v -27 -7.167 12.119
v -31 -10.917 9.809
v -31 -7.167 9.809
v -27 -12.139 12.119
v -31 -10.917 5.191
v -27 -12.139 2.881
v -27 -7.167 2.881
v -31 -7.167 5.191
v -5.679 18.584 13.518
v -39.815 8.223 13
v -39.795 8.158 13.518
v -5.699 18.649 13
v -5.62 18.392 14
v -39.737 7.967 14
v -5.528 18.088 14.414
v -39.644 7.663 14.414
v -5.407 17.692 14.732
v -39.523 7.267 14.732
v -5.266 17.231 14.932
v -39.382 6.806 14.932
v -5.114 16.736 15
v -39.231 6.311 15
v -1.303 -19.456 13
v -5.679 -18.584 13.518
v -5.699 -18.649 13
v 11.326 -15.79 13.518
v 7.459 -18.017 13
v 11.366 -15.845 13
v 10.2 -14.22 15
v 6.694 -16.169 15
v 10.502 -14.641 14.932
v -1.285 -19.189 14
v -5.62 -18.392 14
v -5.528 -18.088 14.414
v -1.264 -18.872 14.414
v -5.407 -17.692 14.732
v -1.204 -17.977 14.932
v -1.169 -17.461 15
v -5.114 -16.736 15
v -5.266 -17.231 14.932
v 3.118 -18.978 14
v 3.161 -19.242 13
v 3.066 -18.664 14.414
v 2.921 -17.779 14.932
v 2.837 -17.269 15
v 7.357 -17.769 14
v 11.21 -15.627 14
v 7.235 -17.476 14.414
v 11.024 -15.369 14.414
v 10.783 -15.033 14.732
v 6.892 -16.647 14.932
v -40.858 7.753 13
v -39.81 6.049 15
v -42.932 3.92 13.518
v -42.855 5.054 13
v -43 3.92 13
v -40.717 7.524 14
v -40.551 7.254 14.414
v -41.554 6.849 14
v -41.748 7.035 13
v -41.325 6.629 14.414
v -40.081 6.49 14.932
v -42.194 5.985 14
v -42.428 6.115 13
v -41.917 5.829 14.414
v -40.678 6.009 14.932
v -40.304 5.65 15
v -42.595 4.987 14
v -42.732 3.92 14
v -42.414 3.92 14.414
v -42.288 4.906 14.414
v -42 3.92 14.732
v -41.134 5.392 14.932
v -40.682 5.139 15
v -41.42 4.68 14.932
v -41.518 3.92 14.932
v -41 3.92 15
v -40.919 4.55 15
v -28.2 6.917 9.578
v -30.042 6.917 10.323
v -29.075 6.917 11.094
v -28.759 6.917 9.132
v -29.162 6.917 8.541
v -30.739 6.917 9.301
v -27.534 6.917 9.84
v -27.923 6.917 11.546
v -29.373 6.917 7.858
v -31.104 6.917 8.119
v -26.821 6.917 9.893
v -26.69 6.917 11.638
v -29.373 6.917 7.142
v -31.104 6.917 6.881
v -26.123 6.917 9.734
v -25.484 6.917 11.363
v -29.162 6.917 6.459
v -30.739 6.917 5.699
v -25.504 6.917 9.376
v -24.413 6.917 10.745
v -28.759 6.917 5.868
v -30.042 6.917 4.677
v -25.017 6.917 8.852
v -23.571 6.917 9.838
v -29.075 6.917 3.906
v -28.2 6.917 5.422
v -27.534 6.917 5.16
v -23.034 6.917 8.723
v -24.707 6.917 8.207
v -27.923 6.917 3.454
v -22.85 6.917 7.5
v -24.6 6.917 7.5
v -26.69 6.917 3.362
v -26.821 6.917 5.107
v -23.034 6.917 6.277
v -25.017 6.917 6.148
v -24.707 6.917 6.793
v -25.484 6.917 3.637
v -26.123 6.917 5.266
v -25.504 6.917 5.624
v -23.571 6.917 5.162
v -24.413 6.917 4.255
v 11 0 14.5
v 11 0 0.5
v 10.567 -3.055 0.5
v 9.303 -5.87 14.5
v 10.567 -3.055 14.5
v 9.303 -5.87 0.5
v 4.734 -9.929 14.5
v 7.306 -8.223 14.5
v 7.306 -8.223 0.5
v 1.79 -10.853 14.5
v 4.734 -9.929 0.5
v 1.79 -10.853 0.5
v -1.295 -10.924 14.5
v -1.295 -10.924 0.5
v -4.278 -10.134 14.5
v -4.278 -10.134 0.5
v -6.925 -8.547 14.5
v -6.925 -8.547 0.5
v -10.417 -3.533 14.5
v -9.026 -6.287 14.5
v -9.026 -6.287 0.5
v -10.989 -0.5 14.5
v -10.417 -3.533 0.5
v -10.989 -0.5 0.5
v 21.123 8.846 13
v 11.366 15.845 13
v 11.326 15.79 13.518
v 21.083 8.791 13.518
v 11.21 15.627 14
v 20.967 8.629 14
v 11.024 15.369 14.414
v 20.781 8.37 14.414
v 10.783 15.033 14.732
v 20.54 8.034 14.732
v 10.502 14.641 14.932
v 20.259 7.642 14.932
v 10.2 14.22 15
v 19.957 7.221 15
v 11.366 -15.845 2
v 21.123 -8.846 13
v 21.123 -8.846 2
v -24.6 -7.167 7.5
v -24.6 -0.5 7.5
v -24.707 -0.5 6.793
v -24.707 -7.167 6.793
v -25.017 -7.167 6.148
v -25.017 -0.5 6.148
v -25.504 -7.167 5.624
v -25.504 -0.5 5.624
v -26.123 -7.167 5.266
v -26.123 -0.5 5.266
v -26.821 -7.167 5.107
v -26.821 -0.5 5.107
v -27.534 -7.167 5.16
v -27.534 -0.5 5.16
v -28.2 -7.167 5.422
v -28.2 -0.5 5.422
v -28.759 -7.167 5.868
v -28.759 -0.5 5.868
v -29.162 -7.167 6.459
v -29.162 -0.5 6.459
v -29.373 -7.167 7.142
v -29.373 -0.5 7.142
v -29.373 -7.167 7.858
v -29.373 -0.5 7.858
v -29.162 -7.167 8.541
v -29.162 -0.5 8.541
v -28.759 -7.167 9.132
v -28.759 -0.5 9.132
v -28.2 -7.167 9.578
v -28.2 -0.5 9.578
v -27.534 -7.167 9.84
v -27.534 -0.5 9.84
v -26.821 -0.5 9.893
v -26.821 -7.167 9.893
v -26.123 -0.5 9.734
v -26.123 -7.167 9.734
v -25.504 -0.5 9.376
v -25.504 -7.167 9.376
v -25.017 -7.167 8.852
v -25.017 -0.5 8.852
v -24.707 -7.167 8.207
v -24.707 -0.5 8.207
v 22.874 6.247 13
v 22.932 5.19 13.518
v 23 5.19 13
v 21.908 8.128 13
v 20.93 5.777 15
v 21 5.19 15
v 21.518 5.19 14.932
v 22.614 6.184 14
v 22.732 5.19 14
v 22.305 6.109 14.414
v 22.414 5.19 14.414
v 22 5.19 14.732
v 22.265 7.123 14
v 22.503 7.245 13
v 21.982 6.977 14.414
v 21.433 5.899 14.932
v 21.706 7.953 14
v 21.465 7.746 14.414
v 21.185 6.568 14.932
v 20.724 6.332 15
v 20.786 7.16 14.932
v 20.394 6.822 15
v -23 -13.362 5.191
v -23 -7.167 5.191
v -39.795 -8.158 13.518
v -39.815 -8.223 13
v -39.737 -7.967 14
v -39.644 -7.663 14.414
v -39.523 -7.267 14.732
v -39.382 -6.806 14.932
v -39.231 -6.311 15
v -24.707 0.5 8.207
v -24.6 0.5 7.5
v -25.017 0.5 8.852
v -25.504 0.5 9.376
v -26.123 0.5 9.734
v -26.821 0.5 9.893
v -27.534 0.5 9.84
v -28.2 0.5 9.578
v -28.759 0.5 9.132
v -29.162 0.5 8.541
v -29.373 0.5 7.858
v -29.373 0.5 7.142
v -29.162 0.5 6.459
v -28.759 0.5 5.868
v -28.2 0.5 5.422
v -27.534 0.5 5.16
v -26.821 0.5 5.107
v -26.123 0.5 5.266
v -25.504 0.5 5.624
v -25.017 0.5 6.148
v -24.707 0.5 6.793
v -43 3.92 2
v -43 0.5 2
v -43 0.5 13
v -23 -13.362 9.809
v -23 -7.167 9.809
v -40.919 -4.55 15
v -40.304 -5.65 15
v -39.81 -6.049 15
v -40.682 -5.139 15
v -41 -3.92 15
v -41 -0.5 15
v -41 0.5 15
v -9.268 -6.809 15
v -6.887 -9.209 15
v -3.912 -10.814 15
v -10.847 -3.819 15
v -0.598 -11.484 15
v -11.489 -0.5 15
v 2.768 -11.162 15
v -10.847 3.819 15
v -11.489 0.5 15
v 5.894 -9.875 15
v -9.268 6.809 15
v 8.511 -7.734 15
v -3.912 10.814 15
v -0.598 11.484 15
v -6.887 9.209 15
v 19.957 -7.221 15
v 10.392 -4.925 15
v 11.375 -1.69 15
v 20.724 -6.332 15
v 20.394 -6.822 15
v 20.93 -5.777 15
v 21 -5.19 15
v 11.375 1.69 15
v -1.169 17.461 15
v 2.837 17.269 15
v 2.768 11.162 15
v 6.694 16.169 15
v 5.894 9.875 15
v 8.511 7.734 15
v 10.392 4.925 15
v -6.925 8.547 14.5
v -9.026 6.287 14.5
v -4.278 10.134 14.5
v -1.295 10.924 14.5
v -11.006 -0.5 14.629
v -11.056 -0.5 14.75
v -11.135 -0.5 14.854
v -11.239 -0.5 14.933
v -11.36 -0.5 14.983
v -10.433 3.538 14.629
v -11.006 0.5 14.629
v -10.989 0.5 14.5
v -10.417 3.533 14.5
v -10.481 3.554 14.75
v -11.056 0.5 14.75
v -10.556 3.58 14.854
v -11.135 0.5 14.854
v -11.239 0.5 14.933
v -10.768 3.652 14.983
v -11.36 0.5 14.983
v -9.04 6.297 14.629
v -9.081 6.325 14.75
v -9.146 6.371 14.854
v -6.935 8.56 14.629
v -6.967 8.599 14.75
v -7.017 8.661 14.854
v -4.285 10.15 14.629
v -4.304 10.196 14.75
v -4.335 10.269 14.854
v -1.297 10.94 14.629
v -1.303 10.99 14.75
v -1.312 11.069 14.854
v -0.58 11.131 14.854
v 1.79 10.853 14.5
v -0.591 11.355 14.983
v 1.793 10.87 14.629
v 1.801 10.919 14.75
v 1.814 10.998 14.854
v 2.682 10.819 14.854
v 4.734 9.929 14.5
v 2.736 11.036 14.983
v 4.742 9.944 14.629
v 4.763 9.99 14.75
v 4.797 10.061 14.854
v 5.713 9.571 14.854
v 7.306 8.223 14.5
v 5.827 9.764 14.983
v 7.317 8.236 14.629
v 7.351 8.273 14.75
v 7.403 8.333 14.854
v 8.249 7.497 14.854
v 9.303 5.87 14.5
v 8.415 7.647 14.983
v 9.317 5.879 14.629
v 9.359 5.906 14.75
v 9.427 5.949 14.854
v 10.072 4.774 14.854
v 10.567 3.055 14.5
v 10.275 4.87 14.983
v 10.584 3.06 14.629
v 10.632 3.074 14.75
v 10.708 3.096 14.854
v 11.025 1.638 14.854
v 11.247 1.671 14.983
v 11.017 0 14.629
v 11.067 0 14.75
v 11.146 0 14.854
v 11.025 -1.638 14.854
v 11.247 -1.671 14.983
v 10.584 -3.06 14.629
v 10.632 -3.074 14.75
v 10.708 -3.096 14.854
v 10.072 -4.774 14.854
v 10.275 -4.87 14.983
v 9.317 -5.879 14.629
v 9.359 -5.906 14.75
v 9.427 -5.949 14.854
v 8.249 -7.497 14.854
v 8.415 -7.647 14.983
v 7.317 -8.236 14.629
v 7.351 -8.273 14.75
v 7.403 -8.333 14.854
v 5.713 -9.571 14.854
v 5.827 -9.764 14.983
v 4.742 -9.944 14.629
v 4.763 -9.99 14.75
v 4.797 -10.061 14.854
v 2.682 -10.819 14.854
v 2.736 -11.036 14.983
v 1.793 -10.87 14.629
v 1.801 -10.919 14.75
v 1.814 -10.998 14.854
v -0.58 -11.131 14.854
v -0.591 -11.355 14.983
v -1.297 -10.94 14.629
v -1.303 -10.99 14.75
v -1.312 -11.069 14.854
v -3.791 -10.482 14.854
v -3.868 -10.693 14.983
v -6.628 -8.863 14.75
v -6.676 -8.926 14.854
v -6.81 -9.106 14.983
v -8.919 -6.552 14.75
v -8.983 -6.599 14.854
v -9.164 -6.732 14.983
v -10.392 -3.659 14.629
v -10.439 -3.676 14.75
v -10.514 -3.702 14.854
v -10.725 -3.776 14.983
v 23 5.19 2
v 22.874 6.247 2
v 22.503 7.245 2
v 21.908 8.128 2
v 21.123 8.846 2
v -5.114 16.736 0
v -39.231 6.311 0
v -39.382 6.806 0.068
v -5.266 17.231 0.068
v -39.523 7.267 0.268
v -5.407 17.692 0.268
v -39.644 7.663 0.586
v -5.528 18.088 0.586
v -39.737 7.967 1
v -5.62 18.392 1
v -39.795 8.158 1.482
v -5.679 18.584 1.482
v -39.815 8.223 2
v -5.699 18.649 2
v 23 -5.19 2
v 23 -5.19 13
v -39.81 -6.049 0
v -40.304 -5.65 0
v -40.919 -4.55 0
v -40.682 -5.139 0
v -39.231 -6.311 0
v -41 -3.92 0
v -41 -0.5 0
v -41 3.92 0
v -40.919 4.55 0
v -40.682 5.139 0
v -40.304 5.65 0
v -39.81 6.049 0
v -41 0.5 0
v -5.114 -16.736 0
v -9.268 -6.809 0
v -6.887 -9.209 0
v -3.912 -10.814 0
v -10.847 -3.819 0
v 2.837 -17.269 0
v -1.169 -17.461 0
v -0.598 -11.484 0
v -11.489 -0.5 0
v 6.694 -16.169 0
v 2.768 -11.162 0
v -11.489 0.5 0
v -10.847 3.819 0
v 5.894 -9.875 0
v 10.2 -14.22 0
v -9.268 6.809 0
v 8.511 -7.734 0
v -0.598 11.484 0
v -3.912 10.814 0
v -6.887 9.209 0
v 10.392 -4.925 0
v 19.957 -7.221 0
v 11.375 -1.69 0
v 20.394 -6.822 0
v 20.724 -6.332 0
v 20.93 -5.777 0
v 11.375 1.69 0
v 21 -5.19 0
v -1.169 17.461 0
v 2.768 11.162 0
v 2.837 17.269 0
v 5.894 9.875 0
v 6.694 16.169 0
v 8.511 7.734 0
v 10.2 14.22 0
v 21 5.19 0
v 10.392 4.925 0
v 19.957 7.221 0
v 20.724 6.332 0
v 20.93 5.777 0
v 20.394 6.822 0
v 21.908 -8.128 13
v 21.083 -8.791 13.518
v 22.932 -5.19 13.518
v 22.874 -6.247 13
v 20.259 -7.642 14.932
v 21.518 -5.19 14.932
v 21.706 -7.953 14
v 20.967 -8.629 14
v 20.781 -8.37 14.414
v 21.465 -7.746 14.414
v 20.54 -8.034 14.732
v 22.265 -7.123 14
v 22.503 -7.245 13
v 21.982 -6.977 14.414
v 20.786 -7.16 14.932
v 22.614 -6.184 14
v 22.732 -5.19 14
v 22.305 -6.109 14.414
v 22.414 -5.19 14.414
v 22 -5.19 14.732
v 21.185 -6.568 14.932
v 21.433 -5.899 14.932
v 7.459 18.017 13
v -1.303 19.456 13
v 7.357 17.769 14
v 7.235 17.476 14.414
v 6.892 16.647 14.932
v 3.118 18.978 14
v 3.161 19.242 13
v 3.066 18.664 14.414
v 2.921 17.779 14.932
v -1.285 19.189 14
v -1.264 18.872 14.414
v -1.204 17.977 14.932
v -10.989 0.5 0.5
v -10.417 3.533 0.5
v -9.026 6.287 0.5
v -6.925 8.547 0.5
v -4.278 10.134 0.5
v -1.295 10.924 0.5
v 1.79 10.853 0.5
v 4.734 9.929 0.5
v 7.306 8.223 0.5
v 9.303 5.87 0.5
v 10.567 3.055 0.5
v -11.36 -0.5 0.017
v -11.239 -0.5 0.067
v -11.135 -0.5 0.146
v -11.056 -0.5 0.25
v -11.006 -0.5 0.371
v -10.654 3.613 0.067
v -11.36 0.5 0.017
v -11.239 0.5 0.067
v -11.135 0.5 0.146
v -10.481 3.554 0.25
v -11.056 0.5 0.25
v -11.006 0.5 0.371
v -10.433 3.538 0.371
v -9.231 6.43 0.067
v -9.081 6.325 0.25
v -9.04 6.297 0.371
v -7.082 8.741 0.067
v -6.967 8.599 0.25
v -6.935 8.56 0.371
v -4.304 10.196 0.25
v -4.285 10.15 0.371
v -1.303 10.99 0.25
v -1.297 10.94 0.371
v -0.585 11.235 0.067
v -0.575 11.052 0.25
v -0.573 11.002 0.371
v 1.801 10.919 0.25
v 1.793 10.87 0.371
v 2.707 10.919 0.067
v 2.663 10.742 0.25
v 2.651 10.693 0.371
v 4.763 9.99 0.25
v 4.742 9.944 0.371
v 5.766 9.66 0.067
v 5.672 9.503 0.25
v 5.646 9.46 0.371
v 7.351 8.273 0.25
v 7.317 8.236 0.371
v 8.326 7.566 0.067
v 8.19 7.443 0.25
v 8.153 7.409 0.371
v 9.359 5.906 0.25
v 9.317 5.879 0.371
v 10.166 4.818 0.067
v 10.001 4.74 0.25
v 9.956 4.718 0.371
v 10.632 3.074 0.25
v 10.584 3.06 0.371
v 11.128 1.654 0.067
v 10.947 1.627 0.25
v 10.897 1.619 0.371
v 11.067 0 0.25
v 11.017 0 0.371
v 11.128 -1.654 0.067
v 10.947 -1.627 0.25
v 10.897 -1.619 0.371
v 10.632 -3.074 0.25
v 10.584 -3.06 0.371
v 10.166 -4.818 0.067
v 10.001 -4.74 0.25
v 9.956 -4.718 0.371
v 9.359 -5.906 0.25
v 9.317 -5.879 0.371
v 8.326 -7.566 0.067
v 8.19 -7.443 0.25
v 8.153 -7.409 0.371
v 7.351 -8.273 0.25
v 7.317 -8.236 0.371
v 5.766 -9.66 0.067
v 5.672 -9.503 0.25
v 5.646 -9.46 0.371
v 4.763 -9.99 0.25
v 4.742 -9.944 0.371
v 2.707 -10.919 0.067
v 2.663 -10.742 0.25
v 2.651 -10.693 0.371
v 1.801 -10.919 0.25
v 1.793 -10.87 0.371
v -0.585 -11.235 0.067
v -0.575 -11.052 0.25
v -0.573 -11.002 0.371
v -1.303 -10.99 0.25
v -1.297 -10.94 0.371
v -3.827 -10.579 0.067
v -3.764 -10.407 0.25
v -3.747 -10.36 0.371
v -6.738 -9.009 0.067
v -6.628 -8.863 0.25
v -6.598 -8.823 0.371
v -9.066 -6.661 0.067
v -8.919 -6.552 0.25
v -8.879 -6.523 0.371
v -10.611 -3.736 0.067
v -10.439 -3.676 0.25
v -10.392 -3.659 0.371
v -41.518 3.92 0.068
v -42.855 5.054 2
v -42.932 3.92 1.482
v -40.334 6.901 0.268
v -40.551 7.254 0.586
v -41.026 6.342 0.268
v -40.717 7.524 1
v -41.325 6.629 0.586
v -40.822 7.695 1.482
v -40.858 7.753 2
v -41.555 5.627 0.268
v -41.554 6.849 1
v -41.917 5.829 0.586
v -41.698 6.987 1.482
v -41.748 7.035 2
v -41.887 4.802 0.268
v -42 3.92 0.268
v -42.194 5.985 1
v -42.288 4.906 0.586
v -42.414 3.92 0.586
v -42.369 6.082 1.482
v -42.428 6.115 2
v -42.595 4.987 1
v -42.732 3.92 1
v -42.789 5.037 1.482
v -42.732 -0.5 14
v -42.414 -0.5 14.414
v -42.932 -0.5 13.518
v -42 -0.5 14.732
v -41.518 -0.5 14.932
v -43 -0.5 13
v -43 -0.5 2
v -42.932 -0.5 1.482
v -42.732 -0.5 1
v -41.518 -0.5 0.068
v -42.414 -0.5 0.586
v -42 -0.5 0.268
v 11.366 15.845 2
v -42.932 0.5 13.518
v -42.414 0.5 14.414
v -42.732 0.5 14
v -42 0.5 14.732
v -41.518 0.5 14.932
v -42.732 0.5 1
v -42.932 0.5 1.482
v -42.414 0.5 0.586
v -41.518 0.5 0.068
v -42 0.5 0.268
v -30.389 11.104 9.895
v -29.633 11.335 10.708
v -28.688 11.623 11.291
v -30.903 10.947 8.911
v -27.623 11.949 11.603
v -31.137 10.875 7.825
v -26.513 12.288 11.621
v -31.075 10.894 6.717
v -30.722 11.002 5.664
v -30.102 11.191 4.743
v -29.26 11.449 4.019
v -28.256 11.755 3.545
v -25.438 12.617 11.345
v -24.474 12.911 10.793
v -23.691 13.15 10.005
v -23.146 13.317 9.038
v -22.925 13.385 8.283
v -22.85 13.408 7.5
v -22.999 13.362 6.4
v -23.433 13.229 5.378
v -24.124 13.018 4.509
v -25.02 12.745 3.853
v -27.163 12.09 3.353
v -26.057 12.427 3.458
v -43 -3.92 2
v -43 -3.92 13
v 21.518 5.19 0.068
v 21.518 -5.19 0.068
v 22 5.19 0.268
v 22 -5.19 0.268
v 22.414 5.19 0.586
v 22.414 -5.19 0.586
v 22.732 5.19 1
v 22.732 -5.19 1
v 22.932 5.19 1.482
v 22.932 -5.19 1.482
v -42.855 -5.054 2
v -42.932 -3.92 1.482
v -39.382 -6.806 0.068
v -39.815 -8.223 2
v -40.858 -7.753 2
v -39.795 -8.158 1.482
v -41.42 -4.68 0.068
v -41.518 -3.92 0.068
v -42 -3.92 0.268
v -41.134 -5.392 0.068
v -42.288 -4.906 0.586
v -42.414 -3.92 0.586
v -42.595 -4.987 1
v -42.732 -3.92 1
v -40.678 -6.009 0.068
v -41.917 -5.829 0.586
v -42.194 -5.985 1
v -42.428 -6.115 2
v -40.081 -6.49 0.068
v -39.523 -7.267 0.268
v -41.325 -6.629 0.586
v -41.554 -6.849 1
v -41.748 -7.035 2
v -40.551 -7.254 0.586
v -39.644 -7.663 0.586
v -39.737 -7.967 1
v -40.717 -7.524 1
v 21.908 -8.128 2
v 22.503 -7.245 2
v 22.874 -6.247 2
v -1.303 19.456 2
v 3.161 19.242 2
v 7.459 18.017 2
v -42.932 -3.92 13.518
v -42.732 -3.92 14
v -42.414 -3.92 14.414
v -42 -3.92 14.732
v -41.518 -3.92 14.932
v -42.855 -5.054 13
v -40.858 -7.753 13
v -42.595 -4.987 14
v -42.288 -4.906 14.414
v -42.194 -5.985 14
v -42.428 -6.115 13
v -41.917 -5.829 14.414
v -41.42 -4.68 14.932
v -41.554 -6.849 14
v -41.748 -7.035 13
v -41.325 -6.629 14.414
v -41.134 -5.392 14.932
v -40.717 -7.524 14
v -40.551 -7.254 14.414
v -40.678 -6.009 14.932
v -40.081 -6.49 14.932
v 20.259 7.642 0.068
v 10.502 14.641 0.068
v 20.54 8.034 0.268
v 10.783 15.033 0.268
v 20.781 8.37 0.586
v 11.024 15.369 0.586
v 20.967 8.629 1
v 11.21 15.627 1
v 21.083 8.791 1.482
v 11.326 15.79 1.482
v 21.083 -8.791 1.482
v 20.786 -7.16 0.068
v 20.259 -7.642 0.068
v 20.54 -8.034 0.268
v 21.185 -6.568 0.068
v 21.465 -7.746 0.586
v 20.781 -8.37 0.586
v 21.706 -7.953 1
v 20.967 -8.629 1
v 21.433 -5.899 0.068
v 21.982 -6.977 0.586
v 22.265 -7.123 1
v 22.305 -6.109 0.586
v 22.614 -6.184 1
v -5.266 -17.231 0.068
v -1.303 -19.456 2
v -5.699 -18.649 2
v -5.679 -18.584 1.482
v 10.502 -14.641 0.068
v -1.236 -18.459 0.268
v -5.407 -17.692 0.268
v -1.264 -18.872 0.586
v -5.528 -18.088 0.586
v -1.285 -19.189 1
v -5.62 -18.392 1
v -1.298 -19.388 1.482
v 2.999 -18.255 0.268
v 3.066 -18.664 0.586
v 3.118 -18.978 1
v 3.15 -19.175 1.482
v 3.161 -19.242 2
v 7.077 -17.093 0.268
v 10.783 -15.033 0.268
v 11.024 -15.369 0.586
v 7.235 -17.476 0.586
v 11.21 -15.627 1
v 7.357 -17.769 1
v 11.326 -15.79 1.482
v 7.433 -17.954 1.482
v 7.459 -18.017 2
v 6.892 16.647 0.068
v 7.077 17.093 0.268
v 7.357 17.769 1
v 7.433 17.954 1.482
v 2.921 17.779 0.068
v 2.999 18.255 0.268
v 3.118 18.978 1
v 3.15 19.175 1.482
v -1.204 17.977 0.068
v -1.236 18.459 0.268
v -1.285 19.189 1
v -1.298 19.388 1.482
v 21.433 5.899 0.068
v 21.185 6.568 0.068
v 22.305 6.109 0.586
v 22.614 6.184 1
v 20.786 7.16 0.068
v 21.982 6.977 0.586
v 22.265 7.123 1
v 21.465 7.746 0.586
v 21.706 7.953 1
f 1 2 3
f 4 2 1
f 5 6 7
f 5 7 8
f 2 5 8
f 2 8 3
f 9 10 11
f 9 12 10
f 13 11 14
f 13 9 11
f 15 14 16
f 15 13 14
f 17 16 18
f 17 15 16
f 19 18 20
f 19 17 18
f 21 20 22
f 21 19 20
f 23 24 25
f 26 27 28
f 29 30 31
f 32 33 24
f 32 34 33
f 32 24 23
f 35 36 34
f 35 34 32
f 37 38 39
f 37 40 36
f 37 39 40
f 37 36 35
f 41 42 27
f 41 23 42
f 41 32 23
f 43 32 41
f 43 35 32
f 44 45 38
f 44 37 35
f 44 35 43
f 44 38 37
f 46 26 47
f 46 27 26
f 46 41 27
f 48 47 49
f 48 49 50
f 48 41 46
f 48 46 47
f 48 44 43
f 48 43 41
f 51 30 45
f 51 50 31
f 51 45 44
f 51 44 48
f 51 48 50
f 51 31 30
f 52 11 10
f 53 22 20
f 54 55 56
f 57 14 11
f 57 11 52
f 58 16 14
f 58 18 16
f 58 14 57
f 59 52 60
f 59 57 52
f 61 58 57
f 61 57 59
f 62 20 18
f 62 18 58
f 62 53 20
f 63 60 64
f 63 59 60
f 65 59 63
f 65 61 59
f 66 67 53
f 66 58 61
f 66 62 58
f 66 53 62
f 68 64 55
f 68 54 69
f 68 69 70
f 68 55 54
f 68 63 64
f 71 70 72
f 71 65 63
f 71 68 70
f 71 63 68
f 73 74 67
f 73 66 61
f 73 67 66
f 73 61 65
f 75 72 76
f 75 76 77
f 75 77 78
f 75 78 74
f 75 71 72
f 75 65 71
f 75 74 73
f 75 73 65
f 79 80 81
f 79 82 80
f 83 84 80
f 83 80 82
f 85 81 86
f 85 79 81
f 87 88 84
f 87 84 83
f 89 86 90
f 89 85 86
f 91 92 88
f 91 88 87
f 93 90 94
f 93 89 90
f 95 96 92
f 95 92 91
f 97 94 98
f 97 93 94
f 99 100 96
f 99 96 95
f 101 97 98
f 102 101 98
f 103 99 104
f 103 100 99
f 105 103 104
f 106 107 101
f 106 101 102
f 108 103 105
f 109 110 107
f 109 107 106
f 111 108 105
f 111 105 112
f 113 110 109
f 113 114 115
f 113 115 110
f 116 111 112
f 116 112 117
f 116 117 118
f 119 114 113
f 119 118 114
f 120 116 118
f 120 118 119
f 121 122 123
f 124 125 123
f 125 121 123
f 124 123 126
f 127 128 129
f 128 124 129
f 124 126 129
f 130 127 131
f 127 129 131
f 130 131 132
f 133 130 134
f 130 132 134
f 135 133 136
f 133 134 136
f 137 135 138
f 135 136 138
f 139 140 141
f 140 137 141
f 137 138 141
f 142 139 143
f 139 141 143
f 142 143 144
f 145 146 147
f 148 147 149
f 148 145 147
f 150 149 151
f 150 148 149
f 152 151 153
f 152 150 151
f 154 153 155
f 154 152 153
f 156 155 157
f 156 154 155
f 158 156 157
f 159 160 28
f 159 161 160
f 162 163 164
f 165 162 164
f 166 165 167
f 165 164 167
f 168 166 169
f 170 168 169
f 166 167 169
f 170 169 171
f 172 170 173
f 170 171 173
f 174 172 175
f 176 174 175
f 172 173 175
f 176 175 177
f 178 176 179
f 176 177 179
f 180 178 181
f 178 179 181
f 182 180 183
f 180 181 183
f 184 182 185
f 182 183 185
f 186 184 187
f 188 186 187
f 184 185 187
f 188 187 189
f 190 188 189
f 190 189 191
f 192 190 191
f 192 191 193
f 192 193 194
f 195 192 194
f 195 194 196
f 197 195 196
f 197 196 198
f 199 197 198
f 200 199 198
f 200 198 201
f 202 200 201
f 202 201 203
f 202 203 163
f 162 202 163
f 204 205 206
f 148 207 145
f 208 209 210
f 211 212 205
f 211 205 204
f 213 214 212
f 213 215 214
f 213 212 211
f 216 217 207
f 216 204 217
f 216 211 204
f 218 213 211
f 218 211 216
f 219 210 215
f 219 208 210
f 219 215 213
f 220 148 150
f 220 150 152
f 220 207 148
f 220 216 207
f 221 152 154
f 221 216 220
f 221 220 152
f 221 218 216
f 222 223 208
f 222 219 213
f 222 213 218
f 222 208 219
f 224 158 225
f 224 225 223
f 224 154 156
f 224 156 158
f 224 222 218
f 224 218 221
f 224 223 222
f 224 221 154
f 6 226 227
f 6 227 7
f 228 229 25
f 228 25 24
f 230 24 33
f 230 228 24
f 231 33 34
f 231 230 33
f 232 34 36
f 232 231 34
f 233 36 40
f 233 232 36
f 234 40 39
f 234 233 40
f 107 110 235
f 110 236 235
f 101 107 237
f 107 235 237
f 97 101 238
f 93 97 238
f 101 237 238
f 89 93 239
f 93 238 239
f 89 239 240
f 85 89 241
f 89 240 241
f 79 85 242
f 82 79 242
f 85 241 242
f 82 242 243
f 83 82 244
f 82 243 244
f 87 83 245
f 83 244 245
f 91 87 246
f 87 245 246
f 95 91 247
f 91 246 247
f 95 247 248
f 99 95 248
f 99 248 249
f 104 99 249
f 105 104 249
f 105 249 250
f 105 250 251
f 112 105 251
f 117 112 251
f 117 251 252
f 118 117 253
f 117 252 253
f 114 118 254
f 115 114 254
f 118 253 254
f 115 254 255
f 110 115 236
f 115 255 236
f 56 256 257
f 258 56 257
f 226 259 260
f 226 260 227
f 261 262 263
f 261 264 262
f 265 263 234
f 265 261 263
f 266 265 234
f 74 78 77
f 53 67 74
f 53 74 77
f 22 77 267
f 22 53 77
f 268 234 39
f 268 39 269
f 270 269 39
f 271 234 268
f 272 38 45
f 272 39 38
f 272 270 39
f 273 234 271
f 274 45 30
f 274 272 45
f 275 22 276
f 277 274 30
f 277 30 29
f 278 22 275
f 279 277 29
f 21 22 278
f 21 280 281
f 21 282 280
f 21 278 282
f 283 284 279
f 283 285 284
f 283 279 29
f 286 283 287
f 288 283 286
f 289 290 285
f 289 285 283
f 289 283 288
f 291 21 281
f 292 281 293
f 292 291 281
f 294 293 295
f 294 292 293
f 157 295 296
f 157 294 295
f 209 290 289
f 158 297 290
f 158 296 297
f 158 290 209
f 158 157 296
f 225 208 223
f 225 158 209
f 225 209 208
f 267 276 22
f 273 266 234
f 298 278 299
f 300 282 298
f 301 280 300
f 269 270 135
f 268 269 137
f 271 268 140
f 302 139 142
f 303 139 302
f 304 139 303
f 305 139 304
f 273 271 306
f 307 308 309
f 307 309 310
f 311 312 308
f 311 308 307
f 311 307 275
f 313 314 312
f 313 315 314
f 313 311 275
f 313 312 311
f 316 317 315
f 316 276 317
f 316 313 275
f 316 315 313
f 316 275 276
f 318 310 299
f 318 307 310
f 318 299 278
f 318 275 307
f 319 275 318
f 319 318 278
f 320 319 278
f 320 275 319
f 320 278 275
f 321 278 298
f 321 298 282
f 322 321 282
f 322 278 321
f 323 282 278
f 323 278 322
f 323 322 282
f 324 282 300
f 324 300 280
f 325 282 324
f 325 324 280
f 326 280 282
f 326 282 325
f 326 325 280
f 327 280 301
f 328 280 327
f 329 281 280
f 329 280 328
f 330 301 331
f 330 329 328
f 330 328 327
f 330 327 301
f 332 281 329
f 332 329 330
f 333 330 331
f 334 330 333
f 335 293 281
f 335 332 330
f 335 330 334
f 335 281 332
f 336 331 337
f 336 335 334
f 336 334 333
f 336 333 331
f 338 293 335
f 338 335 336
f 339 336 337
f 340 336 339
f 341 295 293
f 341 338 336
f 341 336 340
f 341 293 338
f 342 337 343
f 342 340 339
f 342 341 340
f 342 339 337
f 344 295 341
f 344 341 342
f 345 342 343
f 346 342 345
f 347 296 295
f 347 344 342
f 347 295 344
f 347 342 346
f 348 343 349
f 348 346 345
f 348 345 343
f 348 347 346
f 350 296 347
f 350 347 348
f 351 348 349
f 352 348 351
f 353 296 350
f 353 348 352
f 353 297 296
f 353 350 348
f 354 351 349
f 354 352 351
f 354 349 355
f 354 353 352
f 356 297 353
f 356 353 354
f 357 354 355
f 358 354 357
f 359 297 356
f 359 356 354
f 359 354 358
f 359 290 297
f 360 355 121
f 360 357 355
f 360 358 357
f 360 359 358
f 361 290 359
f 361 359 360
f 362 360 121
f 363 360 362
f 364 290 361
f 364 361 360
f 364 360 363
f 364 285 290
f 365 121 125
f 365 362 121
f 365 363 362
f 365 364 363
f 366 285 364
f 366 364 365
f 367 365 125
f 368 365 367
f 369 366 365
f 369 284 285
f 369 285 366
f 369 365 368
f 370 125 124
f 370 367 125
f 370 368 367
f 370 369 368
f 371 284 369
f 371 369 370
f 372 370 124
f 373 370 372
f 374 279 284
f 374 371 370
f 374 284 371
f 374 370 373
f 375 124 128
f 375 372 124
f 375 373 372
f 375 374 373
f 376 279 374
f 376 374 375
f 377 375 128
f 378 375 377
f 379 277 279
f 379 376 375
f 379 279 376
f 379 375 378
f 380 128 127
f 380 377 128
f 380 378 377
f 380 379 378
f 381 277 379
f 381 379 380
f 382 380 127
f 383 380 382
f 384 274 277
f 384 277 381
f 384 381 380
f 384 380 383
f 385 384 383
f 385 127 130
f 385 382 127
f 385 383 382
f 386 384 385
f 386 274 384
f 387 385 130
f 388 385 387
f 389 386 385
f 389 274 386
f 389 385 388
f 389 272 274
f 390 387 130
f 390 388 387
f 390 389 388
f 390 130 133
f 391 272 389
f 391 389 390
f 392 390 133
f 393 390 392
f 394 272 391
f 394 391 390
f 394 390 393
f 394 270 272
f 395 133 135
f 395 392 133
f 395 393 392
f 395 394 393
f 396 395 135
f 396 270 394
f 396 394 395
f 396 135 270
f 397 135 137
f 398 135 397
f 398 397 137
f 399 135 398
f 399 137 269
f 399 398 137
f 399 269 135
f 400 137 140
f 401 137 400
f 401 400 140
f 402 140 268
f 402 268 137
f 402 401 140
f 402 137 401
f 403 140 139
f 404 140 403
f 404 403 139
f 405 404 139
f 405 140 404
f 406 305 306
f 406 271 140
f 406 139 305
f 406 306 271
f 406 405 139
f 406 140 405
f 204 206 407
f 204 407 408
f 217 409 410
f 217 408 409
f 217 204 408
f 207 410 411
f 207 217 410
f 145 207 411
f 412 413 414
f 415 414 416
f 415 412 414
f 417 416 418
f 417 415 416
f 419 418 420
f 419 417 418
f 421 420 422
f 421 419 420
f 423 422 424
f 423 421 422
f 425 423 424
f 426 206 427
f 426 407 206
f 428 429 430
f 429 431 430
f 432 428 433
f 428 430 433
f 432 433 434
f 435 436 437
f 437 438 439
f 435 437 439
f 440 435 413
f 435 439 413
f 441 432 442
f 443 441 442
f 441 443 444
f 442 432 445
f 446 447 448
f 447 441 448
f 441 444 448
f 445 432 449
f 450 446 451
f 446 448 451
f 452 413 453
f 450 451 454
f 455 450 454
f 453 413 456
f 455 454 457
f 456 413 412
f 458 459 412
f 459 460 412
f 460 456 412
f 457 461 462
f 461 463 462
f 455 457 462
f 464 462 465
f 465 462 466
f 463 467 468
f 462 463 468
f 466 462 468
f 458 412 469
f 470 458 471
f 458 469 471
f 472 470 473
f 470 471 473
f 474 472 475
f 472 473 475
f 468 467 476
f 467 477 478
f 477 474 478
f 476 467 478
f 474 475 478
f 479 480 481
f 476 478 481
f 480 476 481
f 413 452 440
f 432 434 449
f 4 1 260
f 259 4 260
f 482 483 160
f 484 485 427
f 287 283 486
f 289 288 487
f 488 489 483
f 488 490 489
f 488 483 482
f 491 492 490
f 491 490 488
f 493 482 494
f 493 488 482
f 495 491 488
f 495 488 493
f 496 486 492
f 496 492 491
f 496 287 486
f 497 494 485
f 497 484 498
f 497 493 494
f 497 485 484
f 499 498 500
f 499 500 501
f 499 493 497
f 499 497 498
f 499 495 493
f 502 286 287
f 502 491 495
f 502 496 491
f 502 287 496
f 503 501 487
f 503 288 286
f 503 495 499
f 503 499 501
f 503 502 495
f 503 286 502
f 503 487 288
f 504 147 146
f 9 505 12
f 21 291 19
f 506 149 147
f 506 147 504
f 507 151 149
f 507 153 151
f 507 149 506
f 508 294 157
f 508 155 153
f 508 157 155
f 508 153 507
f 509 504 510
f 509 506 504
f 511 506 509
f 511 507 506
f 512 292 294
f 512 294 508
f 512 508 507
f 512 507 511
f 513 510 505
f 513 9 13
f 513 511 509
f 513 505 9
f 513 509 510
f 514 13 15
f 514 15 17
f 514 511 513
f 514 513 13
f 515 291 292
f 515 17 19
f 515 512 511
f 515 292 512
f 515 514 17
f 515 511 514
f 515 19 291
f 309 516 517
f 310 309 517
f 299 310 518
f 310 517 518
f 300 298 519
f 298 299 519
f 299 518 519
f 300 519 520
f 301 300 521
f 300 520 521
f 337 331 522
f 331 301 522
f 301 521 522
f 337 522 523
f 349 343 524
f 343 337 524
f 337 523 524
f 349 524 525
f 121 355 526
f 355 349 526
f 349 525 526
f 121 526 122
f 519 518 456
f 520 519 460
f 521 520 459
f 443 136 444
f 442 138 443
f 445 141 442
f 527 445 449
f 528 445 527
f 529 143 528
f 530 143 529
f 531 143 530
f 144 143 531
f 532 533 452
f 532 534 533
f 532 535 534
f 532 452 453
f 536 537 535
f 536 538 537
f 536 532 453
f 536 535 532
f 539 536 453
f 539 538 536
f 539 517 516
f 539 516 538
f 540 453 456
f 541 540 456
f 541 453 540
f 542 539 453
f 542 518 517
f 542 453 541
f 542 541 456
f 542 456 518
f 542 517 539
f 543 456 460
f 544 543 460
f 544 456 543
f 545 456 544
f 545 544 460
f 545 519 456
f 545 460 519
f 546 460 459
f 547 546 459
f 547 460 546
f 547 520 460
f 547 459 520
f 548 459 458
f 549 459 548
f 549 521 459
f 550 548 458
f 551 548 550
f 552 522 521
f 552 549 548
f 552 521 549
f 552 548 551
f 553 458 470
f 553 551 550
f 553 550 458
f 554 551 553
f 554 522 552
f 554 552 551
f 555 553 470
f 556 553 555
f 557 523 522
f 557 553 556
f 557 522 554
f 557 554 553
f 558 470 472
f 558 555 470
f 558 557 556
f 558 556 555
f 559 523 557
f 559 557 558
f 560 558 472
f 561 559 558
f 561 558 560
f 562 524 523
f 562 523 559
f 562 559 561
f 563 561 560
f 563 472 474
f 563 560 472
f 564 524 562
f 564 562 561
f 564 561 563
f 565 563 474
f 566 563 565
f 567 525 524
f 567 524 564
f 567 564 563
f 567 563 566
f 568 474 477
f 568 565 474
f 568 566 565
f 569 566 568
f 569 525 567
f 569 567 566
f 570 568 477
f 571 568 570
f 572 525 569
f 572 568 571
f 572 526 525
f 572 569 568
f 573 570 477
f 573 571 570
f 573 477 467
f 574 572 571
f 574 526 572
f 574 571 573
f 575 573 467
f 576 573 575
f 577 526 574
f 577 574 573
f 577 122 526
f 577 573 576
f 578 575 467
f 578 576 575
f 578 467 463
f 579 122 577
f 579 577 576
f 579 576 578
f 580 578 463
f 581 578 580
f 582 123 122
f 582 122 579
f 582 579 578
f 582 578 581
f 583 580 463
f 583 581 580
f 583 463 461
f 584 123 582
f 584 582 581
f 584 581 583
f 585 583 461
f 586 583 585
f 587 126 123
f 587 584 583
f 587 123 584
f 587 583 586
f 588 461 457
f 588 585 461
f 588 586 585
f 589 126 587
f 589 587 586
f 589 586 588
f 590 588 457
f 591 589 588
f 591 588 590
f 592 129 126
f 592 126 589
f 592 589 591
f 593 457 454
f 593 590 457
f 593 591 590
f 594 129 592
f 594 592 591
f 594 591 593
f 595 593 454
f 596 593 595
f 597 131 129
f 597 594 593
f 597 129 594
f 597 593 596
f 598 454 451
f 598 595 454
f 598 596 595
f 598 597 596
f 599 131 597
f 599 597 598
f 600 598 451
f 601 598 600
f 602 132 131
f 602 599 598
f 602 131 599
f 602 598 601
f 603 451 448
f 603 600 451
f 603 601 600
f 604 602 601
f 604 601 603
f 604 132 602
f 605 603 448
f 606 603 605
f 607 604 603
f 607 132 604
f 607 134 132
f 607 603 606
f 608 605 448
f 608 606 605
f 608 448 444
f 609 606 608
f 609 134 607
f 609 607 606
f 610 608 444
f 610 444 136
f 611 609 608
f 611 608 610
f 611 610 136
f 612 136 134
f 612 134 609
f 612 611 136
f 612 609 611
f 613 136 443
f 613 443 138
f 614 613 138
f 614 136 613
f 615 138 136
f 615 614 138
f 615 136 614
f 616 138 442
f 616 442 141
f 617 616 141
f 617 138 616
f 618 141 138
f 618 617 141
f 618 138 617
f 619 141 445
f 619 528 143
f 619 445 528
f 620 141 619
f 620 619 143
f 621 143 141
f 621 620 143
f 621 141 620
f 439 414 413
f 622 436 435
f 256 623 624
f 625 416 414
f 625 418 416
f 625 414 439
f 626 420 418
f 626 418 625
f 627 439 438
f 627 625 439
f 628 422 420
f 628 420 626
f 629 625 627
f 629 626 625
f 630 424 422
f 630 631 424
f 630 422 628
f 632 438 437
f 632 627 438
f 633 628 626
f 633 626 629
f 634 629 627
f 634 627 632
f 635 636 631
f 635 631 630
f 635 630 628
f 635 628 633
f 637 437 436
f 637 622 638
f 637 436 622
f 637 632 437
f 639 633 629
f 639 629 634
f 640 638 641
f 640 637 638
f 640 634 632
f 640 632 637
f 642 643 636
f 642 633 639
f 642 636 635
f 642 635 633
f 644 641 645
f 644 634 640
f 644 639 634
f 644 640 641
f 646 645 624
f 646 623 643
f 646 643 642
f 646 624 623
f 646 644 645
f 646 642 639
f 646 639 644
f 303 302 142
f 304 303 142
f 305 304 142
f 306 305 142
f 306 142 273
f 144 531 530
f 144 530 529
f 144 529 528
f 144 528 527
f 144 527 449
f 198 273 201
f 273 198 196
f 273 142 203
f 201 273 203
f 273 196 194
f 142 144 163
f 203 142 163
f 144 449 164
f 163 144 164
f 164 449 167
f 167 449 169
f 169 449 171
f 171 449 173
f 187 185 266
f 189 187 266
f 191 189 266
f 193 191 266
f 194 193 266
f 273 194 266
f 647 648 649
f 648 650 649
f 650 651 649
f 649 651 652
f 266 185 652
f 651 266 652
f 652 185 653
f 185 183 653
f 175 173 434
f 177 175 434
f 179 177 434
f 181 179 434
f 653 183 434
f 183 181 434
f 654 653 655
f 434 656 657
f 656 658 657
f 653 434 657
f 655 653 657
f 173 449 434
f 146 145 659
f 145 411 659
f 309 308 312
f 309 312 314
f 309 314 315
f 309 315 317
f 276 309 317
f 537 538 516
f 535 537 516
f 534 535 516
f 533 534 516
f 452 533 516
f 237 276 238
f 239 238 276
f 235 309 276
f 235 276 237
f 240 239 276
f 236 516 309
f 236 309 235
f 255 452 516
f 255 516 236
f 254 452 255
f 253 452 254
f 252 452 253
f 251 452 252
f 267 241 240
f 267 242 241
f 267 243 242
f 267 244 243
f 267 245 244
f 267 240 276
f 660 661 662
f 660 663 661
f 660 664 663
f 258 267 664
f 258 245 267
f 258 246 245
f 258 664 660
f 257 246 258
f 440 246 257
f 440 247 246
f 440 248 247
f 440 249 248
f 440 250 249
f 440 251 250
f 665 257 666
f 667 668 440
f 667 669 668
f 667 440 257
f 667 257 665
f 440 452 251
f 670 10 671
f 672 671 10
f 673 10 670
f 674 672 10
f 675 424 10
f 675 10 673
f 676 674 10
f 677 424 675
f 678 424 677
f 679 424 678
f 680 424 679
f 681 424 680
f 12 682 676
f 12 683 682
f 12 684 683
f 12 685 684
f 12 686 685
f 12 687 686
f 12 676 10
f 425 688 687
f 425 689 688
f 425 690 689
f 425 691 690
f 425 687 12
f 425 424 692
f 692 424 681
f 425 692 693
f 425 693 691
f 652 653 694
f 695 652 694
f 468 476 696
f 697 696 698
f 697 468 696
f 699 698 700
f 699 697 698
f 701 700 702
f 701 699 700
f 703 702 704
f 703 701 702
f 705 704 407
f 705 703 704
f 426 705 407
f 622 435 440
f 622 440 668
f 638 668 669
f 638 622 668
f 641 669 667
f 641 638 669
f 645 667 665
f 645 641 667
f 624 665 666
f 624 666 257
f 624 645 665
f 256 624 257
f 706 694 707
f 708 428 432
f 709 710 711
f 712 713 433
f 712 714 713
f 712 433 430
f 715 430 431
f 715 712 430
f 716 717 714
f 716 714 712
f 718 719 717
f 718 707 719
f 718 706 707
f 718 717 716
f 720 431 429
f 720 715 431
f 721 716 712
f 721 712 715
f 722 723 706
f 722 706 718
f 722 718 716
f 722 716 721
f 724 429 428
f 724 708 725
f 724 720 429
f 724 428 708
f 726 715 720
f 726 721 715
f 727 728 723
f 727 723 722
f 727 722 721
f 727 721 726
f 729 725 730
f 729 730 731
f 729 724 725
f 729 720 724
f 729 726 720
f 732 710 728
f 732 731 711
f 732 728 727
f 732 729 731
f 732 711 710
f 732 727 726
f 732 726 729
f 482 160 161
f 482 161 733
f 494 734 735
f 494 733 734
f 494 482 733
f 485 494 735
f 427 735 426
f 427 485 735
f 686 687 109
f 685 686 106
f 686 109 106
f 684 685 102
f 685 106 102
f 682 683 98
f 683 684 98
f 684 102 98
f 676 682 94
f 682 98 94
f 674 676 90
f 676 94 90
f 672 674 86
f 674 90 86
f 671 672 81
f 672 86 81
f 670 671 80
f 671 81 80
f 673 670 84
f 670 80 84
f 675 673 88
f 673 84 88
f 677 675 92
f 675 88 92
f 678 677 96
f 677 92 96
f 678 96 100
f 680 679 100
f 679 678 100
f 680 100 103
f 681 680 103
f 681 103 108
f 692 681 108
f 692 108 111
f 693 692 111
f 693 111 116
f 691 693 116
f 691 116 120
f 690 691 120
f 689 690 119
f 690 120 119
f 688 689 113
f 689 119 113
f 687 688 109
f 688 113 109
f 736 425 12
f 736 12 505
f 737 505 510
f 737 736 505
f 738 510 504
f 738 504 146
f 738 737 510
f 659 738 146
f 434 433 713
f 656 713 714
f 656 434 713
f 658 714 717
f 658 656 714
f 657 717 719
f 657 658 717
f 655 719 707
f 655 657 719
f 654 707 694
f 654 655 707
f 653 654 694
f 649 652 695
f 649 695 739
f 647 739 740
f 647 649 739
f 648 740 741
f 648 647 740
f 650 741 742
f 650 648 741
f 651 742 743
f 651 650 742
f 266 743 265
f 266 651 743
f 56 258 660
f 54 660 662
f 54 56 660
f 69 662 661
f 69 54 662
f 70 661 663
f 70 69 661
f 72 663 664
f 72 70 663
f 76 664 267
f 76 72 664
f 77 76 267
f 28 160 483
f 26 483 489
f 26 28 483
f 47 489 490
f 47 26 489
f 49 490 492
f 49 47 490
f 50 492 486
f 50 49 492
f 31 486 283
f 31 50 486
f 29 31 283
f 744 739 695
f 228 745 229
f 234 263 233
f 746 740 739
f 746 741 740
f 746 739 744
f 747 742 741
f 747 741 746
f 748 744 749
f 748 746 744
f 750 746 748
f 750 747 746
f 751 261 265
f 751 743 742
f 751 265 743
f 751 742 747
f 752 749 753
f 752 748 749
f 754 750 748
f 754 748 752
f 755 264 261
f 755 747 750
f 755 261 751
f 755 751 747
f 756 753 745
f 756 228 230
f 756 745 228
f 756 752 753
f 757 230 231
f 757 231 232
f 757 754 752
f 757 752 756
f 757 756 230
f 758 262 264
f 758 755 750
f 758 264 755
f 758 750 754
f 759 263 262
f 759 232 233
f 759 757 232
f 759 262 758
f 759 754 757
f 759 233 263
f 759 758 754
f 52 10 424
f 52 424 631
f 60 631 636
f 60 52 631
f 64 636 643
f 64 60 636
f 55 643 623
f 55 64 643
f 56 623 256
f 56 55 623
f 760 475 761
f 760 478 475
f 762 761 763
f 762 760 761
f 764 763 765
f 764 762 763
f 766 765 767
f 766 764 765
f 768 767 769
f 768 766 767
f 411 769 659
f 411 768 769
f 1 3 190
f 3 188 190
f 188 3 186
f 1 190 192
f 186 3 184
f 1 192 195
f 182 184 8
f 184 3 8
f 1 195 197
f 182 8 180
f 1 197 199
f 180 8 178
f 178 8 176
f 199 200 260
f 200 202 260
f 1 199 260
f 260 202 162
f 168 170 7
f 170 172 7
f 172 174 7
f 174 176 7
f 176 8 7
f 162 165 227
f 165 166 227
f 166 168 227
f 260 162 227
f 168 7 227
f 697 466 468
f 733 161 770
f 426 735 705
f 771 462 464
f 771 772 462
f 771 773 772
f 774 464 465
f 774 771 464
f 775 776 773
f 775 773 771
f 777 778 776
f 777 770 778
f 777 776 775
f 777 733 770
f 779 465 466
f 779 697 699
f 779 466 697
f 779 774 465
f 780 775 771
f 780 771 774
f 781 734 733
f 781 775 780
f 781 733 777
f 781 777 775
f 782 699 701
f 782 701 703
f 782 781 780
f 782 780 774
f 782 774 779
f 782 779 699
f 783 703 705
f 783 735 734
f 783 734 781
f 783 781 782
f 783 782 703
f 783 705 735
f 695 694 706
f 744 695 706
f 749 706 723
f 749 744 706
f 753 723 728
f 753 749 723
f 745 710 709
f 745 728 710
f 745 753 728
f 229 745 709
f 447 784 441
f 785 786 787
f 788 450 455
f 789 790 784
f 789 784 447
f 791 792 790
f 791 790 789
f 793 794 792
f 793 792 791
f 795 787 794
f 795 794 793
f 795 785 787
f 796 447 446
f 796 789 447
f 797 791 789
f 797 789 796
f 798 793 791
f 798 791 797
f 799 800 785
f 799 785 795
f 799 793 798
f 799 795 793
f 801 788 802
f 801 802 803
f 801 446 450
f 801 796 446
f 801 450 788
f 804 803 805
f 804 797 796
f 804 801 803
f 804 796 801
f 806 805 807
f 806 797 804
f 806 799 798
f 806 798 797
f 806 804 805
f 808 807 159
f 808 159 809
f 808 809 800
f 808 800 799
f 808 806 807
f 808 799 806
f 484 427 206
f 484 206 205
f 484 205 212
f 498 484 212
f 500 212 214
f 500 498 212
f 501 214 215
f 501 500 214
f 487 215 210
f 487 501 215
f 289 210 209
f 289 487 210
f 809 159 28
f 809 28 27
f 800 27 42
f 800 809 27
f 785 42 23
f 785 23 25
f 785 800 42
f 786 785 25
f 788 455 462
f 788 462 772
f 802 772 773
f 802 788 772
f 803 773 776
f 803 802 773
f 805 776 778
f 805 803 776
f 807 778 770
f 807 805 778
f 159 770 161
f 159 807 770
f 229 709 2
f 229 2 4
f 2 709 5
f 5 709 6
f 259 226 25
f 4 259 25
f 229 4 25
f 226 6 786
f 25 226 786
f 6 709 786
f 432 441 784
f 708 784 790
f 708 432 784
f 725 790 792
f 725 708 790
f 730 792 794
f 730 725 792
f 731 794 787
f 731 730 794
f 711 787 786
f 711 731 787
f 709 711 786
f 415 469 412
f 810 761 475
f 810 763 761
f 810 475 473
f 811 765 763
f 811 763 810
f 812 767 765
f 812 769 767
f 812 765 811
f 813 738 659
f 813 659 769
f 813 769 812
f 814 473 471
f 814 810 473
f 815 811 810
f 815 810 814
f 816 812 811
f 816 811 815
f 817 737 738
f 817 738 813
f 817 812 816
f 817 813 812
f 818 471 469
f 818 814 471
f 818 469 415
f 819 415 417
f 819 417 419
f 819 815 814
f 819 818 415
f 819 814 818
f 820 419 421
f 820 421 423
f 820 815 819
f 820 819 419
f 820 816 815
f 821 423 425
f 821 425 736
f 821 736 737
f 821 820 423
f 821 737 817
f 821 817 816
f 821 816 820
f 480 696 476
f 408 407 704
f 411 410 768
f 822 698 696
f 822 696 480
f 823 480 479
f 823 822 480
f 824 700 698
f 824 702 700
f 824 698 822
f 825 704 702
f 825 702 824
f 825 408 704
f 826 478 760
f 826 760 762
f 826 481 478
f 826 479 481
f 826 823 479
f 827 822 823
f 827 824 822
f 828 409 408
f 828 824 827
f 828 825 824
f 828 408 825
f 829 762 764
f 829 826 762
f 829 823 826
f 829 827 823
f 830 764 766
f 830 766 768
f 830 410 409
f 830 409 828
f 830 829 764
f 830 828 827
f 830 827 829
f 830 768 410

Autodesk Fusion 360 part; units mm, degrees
sketch "Sketch1" plane through (0, 0, 0) normal (0, 0, 1) x (1, 0, 0)
  circle A0 centre (0, 0) radius 11
  circle A1 centre (0, 0) radius 19.5
  line L0 (-43, 7.25) -> (-43, -7.25)
  line L1 (23, 7.5) -> (23, -7.5)
  line L2 (-43, 7.25) -> (-5.6988, 18.6487)
  line L3 (-43, -7.25) -> (-5.6988, -18.6487)
  line L4 (23, 7.5) -> (11.3657, 15.8452)
  line L5 (23, -7.5) -> (11.3657, -15.8452)
  line L6 (-31, 0) -> (-23, 0) construction
  line L7 (-19.5, 0) -> (-43, 0) construction
  line L8 (-31, 10.917) -> (-31, -10.917)
  line L9 (-10.9886, 0.5) -> (-43, 0.5)
  line L10 (-10.9886, -0.5) -> (-43, -0.5)
  line L11 (-10.9886, 0.5) -> (-10.9886, -0.5) construction
  line L12 (-11, 0) -> (-43, 0) construction
  line L13 (-31, -10.917) -> (-1.3486, -10.917) construction
  line L14 (-31, 10.917) -> (-1.3486, 10.917) construction
  point P0 (11, 0)
  point P1 (-43, 0)
  point P2 (23, 0)
  point P3 (-11, 0)
  point P4 (-19.5, 0)
  point P5 (-10.9886, 0)
  point P6 (-27, 0)
  point P7 (-27, 0)
  dimension "d1" = 22
  dimension "d2" = 8.5
  dimension "d7" = 14.5
  dimension "d8" = 15
  dimension "d9" = 12
  dimension "d14" = 8
  dimension "d15" = 12
  dimension "d16" = 3.5
  dimension "d17" = 32
  dimension "d47" = 1
  dimension "d48" = 20.0114
extrude "Extrude1" add sketch "Sketch1" along normal blind 15 contours A0 A1 L9 L10 | A1 L2 L8 L9 | A1 L3 L8 L10 | L0 L2 L8 L9 | L0 L3 L8 L10 | A1 L1 L4 L5 picked at (-9.972, 13.3152)
sketch "Sketch2" plane through (0, 0, 0) normal (0, 1, 0) x (1, 0, 0)
  line L0 (-19.5, 0) -> (-43, 0)
  line L1 (-43, -15) -> (-5.6988, -15) construction
  circle A0 centre (-27, -7.5) radius 2.4
  line L2 (-23, -5.1906) -> (-27, -2.8812)
  line L3 (-27, -2.8812) -> (-31, -5.1906)
  line L4 (-31, -5.1906) -> (-31, -9.8094)
  line L5 (-31, -9.8094) -> (-27, -12.1188)
  line L6 (-27, -12.1188) -> (-23, -9.8094)
  line L7 (-23, -9.8094) -> (-23, -5.1906)
  line L8 (-43, 0) -> (-5.6988, 0) construction
  line L9 (-5.6988, 0) -> (-5.6988, -15) construction
  line L10 (-5.6988, -15) -> (-43, -15) construction
  line L11 (-43, -15) -> (-43, 0) construction
  line L12 (-31, -15) -> (-31, 0) construction
  line L13 (-43, 0) -> (-5.6988, 0) construction
  circle A1 centre (-27, -7.5) radius 4.15
  line L14 (-27, 0) -> (-27, -15) construction
  point P0 (-31.25, 0)
  point P1 (-27, -7.5)
  point P2 (-27, -7.5)
  point P3 (-31, 0)
  point P4 (-27, 0)
  point P5 (-27, -7.5)
  dimension "d24" = 4.8
  dimension "d25" = 4
  dimension "d39" = 8.3
ref_plane "WorkPlane3" through (-16.1743, -10.917, 0) normal (0, -1, 0) x (1, 0, 0)
ref_plane "WorkPlane4" through (-16.1743, 10.917, 0) normal (0, -1, 0) x (1, 0, 0)
extrude "Extrude3" cut sketch "Sketch2" along normal blind 3.75 and the other way blind 30 from surface at -10.917 contours A0 | L2 L7 A1 | L2 L3 L4 L5 L6 L7 A1 | L2 L3 A1 | L6 L7 A1 | L3 L4 A1 | L5 L6 A1 | L4 L5 A1
extrude "Extrude4" cut sketch "Sketch2" along normal mid plane 40 contours A0
extrude "Extrude5" cut sketch "Sketch2" along normal blind 8.5 and the other way blind 4 from surface at 10.917 contours A0 | L2 L3 L4 L5 L6 L7 A1 | L2 A1 | L7 A1 | L3 A1 | L6 A1 | L4 A1 | L5 A1
sketch "Sketch3" plane through (0, 0, 15) normal (0, 0, 1) x (-1, 0, 0)
  arc A0 (10.9886, 0.5) -> (10.9886, -0.5) centre (0, 0) ccw
  line L0 (10.9886, 0.5) -> (43, 0.5)
  line L1 (43, 0.5) -> (43, 7.25)
  line L2 (43, 7.25) -> (5.6988, 18.6487)
  arc A1 (5.6988, 18.6487) -> (-11.3657, 15.8452) centre (0, 0) ccw
  line L3 (-11.3657, 15.8452) -> (-23, 7.5)
  line L4 (-23, 7.5) -> (-23, -7.5)
  line L5 (-23, -7.5) -> (-11.3657, -15.8452)
  arc A2 (-11.3657, -15.8452) -> (5.6988, -18.6487) centre (0, 0) ccw
  line L6 (5.6988, -18.6487) -> (43, -7.25)
  line L7 (43, -7.25) -> (43, -0.5)
  line L8 (43, -0.5) -> (10.9886, -0.5)
fillet "Fillet1" radius 4.5 4 edges at (-43, -7.25, 7.5) (23, -7.5, 7.5) (23, 7.5, 7.5) (-43, 7.25, 7.5)
fillet "Fillet2" radius 2 26 edges at (16.2443, -12.3458, 15) (22.5033, -7.245, 15) (23, 0, 15) (22.5033, 7.245, 15) (16.2443, 12.3458, 15) (3.1612, 19.2421, 15) (-22.7569, 13.436, 15) (-42.1172, 6.5967, 15) (-43, 2.2099, 15) (-43, -2.2099, 15) (-42.1172, -6.5967, 15) (-22.7569, -13.436, 15) (3.1612, -19.2421, 15) (16.2443, -12.3458, 0) (22.5033, -7.245, 0) (23, 0, 0) (22.5033, 7.245, 0) (16.2443, 12.3458, 0) (3.1612, 19.2421, 0) (-22.7569, 13.436, 0) (-42.1172, 6.5967, 0) (-43, 2.2099, 0) (-43, -2.2099, 0) (-42.1172, -6.5967, 0) (-22.7569, -13.436, 0) (3.1612, -19.2421, 0)
fillet "Fillet3" radius 0.5 2 edges at (11, 0, 15) (11, 0, 0)
sketch "Sketch6" plane through (0, 0, 15) normal (0, 0, 1) x (-1, 0, 0)
  line L0 (43, 0.5) -> (43, 7.25)
  line L1 (43, 7.25) -> (5.6988, 18.6487)
  arc A0 (5.6988, 18.6487) -> (-11.3657, 15.8452) centre (0, 0) ccw
  line L2 (-11.3657, 15.8452) -> (-23, 7.5)
  line L3 (-23, 7.5) -> (-23, -7.5)
  line L4 (-23, -7.5) -> (-11.3657, -15.8452)
  arc A1 (-11.3657, -15.8452) -> (5.6988, -18.6487) centre (0, 0) ccw
  line L5 (5.6988, -18.6487) -> (43, -7.25)
  line L6 (43, -7.25) -> (43, -0.5)
  line L7 (43, 0.5) -> (43, -0.5)
  line L8 (-23, 1.25) -> (-23.5, 0)
  line L9 (-23.5, 0) -> (-23, -1.25)
  line L10 (-23, 1.25) -> (-23, -1.25)
  point P0 (-23, 0)
  dimension "d60" = 0.5
  dimension "d61" = 2.5
equation "d25 = ( 8 / 2 ) * 1 mm"
